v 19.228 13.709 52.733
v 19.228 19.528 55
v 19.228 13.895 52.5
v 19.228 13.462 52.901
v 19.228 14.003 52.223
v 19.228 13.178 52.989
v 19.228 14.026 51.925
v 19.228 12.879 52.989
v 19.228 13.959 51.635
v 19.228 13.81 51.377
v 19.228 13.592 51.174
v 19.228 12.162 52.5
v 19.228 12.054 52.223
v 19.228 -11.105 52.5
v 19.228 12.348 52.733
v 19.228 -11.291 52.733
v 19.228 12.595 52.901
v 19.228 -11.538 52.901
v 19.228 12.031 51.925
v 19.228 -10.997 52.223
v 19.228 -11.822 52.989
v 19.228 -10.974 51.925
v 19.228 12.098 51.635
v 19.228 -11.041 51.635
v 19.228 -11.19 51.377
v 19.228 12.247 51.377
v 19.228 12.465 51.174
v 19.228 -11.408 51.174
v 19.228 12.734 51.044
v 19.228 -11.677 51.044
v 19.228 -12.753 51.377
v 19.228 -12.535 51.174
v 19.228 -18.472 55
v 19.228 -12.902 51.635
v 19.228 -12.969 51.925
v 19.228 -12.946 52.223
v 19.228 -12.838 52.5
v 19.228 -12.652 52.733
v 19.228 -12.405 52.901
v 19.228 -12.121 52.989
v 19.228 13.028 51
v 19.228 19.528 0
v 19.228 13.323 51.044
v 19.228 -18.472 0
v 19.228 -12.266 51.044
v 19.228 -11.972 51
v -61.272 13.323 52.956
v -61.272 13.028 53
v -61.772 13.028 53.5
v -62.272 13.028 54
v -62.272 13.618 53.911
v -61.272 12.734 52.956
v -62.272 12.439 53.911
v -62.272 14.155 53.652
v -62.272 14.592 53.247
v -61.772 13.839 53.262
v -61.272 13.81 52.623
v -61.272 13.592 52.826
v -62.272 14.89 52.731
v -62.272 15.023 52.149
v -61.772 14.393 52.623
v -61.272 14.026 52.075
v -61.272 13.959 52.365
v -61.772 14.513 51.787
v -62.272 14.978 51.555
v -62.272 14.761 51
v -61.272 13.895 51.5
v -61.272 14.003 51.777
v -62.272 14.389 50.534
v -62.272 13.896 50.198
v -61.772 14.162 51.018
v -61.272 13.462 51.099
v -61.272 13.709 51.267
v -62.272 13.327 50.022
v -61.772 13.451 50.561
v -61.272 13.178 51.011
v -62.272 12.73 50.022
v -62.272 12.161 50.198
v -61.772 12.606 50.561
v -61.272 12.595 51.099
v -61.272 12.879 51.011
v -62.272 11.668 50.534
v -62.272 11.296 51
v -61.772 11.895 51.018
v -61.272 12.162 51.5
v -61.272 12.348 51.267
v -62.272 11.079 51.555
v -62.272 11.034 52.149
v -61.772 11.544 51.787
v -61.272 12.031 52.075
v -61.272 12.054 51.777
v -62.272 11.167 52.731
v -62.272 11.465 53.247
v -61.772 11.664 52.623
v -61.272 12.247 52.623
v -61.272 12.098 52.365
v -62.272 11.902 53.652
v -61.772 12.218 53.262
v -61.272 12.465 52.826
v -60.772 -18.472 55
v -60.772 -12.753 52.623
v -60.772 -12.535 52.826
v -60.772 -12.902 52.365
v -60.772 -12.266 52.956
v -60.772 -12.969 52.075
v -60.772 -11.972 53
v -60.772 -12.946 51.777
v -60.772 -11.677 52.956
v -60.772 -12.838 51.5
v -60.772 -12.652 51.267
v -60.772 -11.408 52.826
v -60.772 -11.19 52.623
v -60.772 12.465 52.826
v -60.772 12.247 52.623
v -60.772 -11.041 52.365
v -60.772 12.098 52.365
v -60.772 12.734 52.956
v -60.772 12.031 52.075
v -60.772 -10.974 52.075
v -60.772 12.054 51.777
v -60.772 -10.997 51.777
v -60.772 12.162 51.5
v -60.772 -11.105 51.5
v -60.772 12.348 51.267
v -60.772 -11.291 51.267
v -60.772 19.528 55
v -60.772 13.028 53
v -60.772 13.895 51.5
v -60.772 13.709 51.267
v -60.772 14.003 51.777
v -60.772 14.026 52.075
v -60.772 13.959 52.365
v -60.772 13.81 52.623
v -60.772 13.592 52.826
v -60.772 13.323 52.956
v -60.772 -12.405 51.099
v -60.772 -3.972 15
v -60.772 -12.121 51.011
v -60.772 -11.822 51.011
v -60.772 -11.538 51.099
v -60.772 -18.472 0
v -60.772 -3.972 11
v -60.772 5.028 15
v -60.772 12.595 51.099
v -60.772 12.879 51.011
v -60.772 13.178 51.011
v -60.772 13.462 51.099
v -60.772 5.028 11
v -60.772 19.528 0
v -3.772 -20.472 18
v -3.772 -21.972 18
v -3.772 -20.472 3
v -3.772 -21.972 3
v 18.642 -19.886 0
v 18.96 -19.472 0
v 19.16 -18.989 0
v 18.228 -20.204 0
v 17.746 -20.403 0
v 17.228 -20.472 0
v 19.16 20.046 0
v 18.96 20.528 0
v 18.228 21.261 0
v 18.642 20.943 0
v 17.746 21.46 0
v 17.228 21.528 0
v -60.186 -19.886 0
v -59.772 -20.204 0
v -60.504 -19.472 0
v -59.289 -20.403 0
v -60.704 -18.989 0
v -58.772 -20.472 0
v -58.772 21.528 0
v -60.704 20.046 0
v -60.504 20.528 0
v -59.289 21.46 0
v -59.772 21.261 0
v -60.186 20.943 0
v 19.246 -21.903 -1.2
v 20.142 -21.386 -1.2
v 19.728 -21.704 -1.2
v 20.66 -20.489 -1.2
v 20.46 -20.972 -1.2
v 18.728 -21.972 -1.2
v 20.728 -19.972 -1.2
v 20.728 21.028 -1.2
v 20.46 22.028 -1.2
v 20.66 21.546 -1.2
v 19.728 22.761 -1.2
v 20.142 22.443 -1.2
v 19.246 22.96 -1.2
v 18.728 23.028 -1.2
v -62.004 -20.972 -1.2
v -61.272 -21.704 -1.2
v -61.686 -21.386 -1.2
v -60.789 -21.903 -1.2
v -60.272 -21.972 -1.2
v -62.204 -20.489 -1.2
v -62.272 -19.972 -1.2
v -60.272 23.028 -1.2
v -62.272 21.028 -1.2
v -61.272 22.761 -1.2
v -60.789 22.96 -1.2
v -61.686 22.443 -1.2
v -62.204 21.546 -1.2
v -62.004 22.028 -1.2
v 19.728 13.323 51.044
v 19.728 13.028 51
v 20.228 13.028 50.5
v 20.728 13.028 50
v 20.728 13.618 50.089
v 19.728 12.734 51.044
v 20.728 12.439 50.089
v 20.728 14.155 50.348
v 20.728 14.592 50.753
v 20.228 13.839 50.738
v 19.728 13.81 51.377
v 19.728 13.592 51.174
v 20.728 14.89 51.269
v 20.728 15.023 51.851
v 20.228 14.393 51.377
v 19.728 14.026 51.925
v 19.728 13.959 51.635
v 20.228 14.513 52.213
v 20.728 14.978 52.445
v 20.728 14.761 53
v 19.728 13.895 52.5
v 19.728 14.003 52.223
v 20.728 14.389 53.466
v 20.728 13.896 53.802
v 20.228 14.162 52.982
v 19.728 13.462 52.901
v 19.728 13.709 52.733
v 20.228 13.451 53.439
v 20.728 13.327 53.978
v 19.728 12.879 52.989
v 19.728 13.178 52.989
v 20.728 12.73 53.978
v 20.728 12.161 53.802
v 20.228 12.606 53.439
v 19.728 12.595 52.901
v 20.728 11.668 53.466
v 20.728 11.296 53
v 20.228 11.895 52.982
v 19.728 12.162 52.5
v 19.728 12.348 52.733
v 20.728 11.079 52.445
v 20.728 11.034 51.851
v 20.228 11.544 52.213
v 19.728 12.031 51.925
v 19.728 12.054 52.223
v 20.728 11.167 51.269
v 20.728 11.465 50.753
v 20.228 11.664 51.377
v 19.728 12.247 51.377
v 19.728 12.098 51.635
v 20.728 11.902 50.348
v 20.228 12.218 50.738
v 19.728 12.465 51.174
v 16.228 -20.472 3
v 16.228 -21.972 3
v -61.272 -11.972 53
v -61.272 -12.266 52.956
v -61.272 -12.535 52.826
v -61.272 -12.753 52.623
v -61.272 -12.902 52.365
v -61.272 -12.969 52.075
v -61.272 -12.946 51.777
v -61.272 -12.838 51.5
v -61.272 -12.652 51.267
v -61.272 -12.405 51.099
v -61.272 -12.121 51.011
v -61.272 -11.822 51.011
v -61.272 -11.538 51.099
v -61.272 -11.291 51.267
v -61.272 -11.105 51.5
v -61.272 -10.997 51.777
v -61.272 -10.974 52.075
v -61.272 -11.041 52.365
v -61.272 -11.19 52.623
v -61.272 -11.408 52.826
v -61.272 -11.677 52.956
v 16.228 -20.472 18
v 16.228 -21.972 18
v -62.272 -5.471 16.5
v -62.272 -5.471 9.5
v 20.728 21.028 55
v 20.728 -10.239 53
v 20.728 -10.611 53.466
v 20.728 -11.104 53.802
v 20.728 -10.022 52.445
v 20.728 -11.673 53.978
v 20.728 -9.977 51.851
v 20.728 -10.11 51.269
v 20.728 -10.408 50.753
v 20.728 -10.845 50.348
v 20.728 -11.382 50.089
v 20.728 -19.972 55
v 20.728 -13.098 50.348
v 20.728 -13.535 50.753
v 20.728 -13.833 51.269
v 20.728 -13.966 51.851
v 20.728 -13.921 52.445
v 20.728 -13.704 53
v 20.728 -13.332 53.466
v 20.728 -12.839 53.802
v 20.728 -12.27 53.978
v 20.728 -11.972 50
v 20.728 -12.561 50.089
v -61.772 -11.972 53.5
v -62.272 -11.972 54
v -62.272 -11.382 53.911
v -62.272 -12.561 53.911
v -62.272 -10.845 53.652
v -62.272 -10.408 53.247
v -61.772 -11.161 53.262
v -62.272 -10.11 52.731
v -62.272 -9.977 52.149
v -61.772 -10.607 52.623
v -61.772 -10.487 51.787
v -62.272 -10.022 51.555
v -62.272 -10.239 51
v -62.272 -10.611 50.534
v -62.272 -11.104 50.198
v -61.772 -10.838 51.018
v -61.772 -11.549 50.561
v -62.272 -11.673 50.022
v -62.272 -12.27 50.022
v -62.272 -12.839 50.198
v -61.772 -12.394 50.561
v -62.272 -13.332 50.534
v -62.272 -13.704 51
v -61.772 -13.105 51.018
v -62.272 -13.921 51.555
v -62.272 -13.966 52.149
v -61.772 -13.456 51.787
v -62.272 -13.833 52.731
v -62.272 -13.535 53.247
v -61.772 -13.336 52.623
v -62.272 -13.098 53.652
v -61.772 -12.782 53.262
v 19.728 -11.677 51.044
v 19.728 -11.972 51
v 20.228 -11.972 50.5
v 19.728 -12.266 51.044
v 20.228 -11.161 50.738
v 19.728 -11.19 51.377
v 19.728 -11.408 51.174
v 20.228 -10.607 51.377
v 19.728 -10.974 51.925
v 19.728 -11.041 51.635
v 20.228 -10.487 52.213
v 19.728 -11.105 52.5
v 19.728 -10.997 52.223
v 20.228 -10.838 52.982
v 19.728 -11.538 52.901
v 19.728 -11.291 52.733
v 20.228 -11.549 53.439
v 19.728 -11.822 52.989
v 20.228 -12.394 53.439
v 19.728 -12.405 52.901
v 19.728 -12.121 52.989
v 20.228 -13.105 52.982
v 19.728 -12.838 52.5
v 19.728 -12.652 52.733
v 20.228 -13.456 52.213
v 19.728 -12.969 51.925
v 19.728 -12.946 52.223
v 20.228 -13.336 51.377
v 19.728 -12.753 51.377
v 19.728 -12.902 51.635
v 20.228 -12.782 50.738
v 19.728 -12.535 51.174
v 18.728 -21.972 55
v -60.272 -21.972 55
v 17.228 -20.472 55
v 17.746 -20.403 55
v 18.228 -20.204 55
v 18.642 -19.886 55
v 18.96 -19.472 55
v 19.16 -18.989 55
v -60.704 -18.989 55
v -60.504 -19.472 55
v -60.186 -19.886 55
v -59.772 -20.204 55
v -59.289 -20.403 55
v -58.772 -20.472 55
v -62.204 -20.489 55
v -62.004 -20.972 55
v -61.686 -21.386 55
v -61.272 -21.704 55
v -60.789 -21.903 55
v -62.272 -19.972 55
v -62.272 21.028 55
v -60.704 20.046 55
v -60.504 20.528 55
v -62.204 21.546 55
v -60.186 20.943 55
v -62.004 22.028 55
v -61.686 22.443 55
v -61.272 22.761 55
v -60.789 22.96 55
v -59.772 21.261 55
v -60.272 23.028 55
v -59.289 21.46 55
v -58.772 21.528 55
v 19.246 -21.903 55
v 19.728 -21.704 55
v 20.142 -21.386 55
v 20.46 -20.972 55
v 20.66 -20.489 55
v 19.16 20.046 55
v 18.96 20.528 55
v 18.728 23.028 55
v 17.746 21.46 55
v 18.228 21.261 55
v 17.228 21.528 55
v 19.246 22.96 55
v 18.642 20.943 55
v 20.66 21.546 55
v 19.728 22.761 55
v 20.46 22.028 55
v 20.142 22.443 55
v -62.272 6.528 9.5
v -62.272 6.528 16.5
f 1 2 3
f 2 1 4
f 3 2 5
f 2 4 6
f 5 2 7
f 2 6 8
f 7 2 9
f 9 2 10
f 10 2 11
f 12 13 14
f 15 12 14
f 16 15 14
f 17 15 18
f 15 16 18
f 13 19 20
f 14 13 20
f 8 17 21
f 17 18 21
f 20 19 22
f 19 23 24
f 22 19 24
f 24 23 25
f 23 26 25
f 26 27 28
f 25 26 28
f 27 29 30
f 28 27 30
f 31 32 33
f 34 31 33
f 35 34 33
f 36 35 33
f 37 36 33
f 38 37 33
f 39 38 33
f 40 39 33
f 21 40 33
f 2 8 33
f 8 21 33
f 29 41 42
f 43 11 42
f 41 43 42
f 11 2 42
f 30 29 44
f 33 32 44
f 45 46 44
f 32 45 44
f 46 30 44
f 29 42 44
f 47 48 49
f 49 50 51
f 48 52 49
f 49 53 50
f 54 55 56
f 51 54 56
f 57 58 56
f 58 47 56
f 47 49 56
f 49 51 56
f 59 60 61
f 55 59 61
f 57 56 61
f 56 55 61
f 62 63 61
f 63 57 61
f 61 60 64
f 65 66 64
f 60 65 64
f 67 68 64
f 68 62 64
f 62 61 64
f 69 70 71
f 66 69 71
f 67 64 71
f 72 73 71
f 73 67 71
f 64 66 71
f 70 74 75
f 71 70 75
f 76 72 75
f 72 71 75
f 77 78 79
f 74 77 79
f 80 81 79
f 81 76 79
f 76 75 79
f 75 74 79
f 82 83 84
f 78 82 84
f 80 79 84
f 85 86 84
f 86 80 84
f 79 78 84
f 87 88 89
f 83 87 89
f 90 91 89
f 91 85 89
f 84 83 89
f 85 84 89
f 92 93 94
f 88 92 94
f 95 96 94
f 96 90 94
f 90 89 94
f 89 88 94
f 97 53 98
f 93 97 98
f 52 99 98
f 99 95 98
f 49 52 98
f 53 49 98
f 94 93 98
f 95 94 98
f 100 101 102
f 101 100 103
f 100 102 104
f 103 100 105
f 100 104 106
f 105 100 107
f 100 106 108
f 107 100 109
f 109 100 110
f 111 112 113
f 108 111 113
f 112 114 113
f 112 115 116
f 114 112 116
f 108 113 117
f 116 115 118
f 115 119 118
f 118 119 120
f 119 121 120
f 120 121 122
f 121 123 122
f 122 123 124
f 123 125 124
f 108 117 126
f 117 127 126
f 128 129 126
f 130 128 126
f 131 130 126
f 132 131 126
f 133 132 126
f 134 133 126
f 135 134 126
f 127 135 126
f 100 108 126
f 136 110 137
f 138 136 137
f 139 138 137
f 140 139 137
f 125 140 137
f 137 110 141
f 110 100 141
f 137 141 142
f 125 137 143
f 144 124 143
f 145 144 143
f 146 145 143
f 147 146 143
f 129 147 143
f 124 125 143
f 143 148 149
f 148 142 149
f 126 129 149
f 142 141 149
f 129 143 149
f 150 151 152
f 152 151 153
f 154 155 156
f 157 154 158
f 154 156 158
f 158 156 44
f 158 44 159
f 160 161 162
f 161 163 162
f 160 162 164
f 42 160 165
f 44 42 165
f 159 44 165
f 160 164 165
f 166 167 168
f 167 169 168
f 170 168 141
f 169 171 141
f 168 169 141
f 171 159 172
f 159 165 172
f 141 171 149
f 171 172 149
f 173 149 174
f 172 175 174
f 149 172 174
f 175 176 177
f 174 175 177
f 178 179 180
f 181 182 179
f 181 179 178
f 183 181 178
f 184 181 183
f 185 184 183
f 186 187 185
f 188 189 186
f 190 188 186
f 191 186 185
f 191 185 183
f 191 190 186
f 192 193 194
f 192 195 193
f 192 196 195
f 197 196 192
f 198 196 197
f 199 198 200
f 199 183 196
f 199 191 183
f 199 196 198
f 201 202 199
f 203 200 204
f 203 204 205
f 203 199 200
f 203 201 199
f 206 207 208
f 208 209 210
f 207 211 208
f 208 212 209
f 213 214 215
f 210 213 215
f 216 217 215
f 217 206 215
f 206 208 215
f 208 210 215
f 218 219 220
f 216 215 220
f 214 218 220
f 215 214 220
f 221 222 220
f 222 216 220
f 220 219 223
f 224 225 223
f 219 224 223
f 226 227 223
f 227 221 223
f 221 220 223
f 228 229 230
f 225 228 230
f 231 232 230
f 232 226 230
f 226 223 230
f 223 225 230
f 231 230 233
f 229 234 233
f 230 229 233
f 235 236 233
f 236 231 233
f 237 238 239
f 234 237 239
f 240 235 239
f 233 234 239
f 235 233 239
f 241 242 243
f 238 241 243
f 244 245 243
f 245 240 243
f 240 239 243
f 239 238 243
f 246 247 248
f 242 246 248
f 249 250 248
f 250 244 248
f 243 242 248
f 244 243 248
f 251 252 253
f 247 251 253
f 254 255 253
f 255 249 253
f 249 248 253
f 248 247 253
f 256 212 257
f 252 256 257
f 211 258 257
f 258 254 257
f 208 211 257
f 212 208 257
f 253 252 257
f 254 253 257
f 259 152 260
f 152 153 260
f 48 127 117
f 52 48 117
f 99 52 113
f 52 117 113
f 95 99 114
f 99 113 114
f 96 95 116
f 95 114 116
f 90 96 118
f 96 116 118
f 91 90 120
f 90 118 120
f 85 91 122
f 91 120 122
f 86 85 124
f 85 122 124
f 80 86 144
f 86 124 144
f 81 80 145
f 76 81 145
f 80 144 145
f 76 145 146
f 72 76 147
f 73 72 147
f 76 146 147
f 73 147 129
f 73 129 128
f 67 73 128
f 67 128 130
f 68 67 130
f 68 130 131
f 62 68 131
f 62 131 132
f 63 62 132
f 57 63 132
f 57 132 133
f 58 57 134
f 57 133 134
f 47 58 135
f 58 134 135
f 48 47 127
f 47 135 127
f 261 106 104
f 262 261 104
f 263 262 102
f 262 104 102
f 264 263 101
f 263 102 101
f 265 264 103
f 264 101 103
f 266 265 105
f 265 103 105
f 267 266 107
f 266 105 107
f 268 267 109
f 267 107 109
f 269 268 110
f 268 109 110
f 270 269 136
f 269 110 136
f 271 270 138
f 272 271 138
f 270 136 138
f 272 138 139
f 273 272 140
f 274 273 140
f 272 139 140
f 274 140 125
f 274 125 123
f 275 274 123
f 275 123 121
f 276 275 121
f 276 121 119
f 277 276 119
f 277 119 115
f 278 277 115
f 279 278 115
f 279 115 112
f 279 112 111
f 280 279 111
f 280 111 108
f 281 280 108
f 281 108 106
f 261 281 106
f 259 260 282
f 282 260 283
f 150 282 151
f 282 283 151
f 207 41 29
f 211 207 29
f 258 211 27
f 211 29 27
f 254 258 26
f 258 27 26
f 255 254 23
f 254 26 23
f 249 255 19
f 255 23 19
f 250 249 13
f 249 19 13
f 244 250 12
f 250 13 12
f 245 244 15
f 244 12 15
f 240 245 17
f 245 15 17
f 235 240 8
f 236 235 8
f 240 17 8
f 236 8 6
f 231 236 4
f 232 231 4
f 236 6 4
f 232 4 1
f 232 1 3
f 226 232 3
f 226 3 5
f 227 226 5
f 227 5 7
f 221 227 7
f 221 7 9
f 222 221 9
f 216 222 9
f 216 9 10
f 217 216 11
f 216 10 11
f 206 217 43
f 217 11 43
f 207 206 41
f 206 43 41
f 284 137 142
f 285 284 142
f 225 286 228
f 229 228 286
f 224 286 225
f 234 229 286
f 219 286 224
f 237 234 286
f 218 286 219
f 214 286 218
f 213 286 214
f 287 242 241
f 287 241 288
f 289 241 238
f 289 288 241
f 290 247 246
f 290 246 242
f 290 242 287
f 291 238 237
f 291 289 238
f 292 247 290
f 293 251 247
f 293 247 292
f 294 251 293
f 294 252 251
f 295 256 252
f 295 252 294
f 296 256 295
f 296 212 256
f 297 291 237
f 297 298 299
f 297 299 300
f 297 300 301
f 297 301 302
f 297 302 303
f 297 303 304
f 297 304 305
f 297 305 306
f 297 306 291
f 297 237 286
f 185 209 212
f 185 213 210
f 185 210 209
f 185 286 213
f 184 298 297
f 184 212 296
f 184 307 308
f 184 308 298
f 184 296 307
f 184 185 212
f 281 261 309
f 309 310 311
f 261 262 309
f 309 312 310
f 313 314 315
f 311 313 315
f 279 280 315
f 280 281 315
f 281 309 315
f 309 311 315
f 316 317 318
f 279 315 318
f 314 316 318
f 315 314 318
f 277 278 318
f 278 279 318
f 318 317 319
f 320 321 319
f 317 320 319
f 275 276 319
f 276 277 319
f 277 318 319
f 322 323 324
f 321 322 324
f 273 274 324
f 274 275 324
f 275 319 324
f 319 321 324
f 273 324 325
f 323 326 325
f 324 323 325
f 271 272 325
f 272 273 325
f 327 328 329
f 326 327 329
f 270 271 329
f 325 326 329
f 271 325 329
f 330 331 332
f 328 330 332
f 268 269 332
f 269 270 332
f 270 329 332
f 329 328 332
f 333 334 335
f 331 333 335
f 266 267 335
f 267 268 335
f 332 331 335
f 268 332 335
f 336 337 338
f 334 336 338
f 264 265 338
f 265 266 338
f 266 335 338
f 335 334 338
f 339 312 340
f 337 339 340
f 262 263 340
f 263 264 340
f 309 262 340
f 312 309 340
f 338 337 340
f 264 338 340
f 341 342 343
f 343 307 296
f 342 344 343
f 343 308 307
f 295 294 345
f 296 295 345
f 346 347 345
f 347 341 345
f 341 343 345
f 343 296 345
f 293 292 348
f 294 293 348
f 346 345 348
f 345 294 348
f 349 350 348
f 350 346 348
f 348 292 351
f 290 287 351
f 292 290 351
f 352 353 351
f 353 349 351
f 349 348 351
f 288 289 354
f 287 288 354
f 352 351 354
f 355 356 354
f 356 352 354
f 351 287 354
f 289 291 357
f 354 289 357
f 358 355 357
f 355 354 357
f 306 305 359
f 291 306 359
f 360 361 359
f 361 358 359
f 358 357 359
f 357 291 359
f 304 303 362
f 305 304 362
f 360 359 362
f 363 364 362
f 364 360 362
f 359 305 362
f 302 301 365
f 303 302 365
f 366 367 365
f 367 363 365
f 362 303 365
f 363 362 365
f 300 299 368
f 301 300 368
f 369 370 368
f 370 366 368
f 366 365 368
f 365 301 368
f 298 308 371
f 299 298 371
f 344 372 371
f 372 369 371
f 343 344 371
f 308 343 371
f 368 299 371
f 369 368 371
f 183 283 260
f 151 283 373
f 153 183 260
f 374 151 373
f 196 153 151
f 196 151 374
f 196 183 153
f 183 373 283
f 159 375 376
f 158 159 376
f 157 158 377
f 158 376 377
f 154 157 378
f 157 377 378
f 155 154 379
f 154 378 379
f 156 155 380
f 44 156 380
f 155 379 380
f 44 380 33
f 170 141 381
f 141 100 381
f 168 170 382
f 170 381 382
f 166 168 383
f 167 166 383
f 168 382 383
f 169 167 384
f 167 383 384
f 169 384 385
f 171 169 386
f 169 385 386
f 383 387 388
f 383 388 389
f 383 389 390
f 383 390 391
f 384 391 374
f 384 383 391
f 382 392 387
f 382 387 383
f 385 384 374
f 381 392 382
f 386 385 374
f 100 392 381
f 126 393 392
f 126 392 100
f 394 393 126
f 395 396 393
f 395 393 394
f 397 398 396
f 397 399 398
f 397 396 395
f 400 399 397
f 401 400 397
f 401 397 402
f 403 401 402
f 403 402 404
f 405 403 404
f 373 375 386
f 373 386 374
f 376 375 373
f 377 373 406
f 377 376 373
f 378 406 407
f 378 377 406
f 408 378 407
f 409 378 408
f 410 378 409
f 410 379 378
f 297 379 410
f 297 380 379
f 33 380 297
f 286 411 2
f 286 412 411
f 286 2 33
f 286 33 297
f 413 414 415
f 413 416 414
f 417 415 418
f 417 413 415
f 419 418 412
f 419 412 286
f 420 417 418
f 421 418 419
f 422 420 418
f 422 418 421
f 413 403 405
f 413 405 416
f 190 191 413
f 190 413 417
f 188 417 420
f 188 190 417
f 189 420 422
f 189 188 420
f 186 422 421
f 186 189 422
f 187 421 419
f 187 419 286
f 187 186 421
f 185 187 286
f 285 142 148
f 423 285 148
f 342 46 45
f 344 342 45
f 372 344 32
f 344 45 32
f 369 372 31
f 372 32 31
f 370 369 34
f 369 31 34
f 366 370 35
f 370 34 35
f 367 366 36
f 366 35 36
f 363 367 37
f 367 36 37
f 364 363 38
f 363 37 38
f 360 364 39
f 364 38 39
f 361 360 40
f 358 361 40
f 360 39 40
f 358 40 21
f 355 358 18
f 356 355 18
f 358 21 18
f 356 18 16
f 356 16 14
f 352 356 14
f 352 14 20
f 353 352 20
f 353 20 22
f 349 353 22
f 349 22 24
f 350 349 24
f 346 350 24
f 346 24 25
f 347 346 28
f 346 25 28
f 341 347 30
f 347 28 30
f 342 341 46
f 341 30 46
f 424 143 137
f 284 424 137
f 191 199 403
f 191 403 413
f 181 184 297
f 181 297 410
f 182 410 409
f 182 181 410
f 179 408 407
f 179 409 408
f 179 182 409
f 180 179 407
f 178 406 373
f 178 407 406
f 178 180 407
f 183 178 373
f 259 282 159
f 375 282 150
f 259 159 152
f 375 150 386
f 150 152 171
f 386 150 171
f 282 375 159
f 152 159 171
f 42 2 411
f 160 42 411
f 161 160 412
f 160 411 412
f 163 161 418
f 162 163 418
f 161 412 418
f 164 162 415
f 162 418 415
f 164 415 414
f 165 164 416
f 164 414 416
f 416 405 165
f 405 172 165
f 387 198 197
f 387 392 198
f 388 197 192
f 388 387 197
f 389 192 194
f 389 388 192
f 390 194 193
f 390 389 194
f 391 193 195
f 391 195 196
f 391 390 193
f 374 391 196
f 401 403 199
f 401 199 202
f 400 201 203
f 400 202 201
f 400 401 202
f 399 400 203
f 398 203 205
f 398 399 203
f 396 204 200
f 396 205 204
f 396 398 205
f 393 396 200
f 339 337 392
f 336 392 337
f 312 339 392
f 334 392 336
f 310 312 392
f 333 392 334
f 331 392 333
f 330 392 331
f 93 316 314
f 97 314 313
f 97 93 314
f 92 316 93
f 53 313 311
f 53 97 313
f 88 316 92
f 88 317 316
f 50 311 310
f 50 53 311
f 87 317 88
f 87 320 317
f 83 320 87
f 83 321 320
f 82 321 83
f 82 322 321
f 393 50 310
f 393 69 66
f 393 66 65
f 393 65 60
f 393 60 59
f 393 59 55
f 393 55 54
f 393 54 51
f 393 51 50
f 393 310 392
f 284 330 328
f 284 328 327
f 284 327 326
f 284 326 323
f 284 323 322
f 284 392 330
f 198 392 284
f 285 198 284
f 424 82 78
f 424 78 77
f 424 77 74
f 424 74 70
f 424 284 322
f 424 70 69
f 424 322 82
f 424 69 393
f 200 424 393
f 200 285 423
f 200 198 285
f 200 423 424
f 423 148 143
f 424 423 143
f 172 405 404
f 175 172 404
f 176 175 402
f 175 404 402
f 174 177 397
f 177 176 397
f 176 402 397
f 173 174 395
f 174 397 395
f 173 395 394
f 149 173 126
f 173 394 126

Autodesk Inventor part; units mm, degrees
ref_plane "YZ Plane" through (0, 0, 0) normal (1, 0, 0) x (0, 1, 0)
ref_plane "XZ Plane" through (0, 0, 0) normal (0, 1, 0) x (-1, 0, 0)
ref_plane "XY Plane" through (0, 0, 0) normal (0, 0, 1) x (1, 0, 0)
sketch "Sketch1" plane through (0, 0, 0) normal (0, 0, 1) x (1, 0, 0)
  line L0 (-60.7718, 21.5285) -> (19.2282, 21.5285)
  line L1 (19.2282, 21.5285) -> (19.2282, -20.4715)
  line L2 (19.2282, -20.4715) -> (-60.7718, -20.4715)
  line L3 (-60.7718, -20.4715) -> (-60.7718, 21.5285)
  line L4 (-62.2718, 23.0285) -> (20.7282, 23.0285)
  line L5 (20.7282, 23.0285) -> (20.7282, -21.9715)
  line L6 (20.7282, -21.9715) -> (-62.2718, -21.9715)
  line L7 (-62.2718, -21.9715) -> (-62.2718, 23.0285)
  point P0 (0, 0)
  dimension "d0" = 80
  dimension "d1" = 42
  dimension "d2" = 1.5
  dimension "d3" = 1.5
  dimension "d4" = 1.5
  dimension "d5" = 1.5
extrude "Extrusion1" add sketch "Sketch1" along normal blind 55
sketch "Sketch2" plane through (0, 0, 0) normal (0, 0, -1) x (-1, 0, 0)
  line L0 (-20.7282, 23.0285) -> (62.2718, 23.0285) projected
  line L1 (62.2718, -21.9715) -> (-20.7282, -21.9715) projected
  line L2 (-20.7282, 23.0285) -> (62.2718, 23.0285)
  line L3 (62.2718, 23.0285) -> (62.2718, -21.9715)
  line L4 (62.2718, -21.9715) -> (-20.7282, -21.9715)
  line L5 (-20.7282, -21.9715) -> (-20.7282, 23.0285)
  point P0 (0, 0)
  point P1 (62.2718, 23.0285)
extrude "Extrusion2" add sketch "Sketch2" along normal blind 1.2
sketch "Sketch3" plane through (-62.2718, -21.9715, 55) normal (-1, 0, 0) x (0, 0, 1)
  line L0 (-40, 27) -> (-44, 27)
  line L1 (-44, 27) -> (-44, 18)
  line L2 (-44, 18) -> (-40, 18)
  line L3 (-40, 18) -> (-40, 27)
  line L4 (-55, 1.5) -> (-55, 43.5) projected
  line L5 (-55, 1.5) -> (0, 1.5) projected
  line L6 (-55, 43.5) -> (0, 43.5) projected
  point P0 (-55, 21.9715)
  dimension "d10" = 11
  dimension "d11" = 15
  dimension "d12" = 9
  dimension "d13" = 16.5
  dimension "d14" = 16.5
extrude "Extrusion3" cut sketch "Sketch3" against normal blind 2
chamfer "Chamfer1" distance 1.5 angle 45 4 edges at (-62.2718, 0.5285, 15) (-62.2718, 0.5285, 11) (-62.2718, 5.0285, 13) (-62.2718, -3.9715, 13)
sketch "Sketch4" plane through (-62.2718, -21.9715, 55) normal (0, -1, 0) x (1, 0, 0)
  line L0 (58.5, -52) -> (78.5, -52)
  line L1 (78.5, -52) -> (78.5, -37)
  line L2 (78.5, -37) -> (58.5, -37)
  line L3 (58.5, -37) -> (58.5, -52)
  line L4 (81.5, -55) -> (1.5, -55) projected
  line L5 (81.5, -55) -> (81.5, 0) projected
  point P0 (62.2718, -55)
  dimension "d20" = 3
  dimension "d21" = 3
  dimension "d22" = 20
  dimension "d23" = 15
extrude "Extrusion4" cut sketch "Sketch4" against normal blind 2
fillet "Fillet1" radius 2 8 edges at (19.2282, 21.5285, 27.5) (20.7282, 23.0285, 26.9) (19.2282, -20.4715, 27.5) (20.7282, -21.9715, 26.9) (-60.7718, -20.4715, 27.5) (-62.2718, -21.9715, 26.9) (-60.7718, 21.5285, 27.5) (-62.2718, 23.0285, 26.9)
sketch "Sketch5" plane through (-62.2718, -19.9715, -1.2) normal (-1, 0, 0) x (0, 0, 1)
  line L0 (56.2, 41) -> (56.2, 0) projected
  line L1 (0, -2) -> (56.2, -2) projected
  line L2 (56.2, 43) -> (0, 43) projected
  point P0 (1.2, 19.9715)
  point P1 (53.2, 8)
  point P2 (53.2, 33)
  dimension "d27" = 3
  dimension "d28" = 3
  dimension "d29" = 10
  dimension "d30" = 10
hole "Hole1" at (-62.2718, -11.9715, 52) at (-62.2718, 13.0285, 52) direction (1, 0, 0) diameter 2 depth 10 tip angle 179 countersink diameter 4 countersink angle 90
sketch "Sketch6" plane through (20.7282, -19.9715, -1.2) normal (1, 0, 0) x (0, 0, -1)
  circle A0 centre (-53.2, 33) radius 1 projected
  circle A1 centre (-53.2, 8) radius 1 projected
  point P0 (-1.2, 19.9715)
hole "Hole2" at (20.7282, 13.0285, 52) at (20.7282, -11.9715, 52) direction (-1, 0, 0) diameter 2 depth 10 tip angle 179 countersink diameter 4 countersink angle 90
properties part number "battery case"
